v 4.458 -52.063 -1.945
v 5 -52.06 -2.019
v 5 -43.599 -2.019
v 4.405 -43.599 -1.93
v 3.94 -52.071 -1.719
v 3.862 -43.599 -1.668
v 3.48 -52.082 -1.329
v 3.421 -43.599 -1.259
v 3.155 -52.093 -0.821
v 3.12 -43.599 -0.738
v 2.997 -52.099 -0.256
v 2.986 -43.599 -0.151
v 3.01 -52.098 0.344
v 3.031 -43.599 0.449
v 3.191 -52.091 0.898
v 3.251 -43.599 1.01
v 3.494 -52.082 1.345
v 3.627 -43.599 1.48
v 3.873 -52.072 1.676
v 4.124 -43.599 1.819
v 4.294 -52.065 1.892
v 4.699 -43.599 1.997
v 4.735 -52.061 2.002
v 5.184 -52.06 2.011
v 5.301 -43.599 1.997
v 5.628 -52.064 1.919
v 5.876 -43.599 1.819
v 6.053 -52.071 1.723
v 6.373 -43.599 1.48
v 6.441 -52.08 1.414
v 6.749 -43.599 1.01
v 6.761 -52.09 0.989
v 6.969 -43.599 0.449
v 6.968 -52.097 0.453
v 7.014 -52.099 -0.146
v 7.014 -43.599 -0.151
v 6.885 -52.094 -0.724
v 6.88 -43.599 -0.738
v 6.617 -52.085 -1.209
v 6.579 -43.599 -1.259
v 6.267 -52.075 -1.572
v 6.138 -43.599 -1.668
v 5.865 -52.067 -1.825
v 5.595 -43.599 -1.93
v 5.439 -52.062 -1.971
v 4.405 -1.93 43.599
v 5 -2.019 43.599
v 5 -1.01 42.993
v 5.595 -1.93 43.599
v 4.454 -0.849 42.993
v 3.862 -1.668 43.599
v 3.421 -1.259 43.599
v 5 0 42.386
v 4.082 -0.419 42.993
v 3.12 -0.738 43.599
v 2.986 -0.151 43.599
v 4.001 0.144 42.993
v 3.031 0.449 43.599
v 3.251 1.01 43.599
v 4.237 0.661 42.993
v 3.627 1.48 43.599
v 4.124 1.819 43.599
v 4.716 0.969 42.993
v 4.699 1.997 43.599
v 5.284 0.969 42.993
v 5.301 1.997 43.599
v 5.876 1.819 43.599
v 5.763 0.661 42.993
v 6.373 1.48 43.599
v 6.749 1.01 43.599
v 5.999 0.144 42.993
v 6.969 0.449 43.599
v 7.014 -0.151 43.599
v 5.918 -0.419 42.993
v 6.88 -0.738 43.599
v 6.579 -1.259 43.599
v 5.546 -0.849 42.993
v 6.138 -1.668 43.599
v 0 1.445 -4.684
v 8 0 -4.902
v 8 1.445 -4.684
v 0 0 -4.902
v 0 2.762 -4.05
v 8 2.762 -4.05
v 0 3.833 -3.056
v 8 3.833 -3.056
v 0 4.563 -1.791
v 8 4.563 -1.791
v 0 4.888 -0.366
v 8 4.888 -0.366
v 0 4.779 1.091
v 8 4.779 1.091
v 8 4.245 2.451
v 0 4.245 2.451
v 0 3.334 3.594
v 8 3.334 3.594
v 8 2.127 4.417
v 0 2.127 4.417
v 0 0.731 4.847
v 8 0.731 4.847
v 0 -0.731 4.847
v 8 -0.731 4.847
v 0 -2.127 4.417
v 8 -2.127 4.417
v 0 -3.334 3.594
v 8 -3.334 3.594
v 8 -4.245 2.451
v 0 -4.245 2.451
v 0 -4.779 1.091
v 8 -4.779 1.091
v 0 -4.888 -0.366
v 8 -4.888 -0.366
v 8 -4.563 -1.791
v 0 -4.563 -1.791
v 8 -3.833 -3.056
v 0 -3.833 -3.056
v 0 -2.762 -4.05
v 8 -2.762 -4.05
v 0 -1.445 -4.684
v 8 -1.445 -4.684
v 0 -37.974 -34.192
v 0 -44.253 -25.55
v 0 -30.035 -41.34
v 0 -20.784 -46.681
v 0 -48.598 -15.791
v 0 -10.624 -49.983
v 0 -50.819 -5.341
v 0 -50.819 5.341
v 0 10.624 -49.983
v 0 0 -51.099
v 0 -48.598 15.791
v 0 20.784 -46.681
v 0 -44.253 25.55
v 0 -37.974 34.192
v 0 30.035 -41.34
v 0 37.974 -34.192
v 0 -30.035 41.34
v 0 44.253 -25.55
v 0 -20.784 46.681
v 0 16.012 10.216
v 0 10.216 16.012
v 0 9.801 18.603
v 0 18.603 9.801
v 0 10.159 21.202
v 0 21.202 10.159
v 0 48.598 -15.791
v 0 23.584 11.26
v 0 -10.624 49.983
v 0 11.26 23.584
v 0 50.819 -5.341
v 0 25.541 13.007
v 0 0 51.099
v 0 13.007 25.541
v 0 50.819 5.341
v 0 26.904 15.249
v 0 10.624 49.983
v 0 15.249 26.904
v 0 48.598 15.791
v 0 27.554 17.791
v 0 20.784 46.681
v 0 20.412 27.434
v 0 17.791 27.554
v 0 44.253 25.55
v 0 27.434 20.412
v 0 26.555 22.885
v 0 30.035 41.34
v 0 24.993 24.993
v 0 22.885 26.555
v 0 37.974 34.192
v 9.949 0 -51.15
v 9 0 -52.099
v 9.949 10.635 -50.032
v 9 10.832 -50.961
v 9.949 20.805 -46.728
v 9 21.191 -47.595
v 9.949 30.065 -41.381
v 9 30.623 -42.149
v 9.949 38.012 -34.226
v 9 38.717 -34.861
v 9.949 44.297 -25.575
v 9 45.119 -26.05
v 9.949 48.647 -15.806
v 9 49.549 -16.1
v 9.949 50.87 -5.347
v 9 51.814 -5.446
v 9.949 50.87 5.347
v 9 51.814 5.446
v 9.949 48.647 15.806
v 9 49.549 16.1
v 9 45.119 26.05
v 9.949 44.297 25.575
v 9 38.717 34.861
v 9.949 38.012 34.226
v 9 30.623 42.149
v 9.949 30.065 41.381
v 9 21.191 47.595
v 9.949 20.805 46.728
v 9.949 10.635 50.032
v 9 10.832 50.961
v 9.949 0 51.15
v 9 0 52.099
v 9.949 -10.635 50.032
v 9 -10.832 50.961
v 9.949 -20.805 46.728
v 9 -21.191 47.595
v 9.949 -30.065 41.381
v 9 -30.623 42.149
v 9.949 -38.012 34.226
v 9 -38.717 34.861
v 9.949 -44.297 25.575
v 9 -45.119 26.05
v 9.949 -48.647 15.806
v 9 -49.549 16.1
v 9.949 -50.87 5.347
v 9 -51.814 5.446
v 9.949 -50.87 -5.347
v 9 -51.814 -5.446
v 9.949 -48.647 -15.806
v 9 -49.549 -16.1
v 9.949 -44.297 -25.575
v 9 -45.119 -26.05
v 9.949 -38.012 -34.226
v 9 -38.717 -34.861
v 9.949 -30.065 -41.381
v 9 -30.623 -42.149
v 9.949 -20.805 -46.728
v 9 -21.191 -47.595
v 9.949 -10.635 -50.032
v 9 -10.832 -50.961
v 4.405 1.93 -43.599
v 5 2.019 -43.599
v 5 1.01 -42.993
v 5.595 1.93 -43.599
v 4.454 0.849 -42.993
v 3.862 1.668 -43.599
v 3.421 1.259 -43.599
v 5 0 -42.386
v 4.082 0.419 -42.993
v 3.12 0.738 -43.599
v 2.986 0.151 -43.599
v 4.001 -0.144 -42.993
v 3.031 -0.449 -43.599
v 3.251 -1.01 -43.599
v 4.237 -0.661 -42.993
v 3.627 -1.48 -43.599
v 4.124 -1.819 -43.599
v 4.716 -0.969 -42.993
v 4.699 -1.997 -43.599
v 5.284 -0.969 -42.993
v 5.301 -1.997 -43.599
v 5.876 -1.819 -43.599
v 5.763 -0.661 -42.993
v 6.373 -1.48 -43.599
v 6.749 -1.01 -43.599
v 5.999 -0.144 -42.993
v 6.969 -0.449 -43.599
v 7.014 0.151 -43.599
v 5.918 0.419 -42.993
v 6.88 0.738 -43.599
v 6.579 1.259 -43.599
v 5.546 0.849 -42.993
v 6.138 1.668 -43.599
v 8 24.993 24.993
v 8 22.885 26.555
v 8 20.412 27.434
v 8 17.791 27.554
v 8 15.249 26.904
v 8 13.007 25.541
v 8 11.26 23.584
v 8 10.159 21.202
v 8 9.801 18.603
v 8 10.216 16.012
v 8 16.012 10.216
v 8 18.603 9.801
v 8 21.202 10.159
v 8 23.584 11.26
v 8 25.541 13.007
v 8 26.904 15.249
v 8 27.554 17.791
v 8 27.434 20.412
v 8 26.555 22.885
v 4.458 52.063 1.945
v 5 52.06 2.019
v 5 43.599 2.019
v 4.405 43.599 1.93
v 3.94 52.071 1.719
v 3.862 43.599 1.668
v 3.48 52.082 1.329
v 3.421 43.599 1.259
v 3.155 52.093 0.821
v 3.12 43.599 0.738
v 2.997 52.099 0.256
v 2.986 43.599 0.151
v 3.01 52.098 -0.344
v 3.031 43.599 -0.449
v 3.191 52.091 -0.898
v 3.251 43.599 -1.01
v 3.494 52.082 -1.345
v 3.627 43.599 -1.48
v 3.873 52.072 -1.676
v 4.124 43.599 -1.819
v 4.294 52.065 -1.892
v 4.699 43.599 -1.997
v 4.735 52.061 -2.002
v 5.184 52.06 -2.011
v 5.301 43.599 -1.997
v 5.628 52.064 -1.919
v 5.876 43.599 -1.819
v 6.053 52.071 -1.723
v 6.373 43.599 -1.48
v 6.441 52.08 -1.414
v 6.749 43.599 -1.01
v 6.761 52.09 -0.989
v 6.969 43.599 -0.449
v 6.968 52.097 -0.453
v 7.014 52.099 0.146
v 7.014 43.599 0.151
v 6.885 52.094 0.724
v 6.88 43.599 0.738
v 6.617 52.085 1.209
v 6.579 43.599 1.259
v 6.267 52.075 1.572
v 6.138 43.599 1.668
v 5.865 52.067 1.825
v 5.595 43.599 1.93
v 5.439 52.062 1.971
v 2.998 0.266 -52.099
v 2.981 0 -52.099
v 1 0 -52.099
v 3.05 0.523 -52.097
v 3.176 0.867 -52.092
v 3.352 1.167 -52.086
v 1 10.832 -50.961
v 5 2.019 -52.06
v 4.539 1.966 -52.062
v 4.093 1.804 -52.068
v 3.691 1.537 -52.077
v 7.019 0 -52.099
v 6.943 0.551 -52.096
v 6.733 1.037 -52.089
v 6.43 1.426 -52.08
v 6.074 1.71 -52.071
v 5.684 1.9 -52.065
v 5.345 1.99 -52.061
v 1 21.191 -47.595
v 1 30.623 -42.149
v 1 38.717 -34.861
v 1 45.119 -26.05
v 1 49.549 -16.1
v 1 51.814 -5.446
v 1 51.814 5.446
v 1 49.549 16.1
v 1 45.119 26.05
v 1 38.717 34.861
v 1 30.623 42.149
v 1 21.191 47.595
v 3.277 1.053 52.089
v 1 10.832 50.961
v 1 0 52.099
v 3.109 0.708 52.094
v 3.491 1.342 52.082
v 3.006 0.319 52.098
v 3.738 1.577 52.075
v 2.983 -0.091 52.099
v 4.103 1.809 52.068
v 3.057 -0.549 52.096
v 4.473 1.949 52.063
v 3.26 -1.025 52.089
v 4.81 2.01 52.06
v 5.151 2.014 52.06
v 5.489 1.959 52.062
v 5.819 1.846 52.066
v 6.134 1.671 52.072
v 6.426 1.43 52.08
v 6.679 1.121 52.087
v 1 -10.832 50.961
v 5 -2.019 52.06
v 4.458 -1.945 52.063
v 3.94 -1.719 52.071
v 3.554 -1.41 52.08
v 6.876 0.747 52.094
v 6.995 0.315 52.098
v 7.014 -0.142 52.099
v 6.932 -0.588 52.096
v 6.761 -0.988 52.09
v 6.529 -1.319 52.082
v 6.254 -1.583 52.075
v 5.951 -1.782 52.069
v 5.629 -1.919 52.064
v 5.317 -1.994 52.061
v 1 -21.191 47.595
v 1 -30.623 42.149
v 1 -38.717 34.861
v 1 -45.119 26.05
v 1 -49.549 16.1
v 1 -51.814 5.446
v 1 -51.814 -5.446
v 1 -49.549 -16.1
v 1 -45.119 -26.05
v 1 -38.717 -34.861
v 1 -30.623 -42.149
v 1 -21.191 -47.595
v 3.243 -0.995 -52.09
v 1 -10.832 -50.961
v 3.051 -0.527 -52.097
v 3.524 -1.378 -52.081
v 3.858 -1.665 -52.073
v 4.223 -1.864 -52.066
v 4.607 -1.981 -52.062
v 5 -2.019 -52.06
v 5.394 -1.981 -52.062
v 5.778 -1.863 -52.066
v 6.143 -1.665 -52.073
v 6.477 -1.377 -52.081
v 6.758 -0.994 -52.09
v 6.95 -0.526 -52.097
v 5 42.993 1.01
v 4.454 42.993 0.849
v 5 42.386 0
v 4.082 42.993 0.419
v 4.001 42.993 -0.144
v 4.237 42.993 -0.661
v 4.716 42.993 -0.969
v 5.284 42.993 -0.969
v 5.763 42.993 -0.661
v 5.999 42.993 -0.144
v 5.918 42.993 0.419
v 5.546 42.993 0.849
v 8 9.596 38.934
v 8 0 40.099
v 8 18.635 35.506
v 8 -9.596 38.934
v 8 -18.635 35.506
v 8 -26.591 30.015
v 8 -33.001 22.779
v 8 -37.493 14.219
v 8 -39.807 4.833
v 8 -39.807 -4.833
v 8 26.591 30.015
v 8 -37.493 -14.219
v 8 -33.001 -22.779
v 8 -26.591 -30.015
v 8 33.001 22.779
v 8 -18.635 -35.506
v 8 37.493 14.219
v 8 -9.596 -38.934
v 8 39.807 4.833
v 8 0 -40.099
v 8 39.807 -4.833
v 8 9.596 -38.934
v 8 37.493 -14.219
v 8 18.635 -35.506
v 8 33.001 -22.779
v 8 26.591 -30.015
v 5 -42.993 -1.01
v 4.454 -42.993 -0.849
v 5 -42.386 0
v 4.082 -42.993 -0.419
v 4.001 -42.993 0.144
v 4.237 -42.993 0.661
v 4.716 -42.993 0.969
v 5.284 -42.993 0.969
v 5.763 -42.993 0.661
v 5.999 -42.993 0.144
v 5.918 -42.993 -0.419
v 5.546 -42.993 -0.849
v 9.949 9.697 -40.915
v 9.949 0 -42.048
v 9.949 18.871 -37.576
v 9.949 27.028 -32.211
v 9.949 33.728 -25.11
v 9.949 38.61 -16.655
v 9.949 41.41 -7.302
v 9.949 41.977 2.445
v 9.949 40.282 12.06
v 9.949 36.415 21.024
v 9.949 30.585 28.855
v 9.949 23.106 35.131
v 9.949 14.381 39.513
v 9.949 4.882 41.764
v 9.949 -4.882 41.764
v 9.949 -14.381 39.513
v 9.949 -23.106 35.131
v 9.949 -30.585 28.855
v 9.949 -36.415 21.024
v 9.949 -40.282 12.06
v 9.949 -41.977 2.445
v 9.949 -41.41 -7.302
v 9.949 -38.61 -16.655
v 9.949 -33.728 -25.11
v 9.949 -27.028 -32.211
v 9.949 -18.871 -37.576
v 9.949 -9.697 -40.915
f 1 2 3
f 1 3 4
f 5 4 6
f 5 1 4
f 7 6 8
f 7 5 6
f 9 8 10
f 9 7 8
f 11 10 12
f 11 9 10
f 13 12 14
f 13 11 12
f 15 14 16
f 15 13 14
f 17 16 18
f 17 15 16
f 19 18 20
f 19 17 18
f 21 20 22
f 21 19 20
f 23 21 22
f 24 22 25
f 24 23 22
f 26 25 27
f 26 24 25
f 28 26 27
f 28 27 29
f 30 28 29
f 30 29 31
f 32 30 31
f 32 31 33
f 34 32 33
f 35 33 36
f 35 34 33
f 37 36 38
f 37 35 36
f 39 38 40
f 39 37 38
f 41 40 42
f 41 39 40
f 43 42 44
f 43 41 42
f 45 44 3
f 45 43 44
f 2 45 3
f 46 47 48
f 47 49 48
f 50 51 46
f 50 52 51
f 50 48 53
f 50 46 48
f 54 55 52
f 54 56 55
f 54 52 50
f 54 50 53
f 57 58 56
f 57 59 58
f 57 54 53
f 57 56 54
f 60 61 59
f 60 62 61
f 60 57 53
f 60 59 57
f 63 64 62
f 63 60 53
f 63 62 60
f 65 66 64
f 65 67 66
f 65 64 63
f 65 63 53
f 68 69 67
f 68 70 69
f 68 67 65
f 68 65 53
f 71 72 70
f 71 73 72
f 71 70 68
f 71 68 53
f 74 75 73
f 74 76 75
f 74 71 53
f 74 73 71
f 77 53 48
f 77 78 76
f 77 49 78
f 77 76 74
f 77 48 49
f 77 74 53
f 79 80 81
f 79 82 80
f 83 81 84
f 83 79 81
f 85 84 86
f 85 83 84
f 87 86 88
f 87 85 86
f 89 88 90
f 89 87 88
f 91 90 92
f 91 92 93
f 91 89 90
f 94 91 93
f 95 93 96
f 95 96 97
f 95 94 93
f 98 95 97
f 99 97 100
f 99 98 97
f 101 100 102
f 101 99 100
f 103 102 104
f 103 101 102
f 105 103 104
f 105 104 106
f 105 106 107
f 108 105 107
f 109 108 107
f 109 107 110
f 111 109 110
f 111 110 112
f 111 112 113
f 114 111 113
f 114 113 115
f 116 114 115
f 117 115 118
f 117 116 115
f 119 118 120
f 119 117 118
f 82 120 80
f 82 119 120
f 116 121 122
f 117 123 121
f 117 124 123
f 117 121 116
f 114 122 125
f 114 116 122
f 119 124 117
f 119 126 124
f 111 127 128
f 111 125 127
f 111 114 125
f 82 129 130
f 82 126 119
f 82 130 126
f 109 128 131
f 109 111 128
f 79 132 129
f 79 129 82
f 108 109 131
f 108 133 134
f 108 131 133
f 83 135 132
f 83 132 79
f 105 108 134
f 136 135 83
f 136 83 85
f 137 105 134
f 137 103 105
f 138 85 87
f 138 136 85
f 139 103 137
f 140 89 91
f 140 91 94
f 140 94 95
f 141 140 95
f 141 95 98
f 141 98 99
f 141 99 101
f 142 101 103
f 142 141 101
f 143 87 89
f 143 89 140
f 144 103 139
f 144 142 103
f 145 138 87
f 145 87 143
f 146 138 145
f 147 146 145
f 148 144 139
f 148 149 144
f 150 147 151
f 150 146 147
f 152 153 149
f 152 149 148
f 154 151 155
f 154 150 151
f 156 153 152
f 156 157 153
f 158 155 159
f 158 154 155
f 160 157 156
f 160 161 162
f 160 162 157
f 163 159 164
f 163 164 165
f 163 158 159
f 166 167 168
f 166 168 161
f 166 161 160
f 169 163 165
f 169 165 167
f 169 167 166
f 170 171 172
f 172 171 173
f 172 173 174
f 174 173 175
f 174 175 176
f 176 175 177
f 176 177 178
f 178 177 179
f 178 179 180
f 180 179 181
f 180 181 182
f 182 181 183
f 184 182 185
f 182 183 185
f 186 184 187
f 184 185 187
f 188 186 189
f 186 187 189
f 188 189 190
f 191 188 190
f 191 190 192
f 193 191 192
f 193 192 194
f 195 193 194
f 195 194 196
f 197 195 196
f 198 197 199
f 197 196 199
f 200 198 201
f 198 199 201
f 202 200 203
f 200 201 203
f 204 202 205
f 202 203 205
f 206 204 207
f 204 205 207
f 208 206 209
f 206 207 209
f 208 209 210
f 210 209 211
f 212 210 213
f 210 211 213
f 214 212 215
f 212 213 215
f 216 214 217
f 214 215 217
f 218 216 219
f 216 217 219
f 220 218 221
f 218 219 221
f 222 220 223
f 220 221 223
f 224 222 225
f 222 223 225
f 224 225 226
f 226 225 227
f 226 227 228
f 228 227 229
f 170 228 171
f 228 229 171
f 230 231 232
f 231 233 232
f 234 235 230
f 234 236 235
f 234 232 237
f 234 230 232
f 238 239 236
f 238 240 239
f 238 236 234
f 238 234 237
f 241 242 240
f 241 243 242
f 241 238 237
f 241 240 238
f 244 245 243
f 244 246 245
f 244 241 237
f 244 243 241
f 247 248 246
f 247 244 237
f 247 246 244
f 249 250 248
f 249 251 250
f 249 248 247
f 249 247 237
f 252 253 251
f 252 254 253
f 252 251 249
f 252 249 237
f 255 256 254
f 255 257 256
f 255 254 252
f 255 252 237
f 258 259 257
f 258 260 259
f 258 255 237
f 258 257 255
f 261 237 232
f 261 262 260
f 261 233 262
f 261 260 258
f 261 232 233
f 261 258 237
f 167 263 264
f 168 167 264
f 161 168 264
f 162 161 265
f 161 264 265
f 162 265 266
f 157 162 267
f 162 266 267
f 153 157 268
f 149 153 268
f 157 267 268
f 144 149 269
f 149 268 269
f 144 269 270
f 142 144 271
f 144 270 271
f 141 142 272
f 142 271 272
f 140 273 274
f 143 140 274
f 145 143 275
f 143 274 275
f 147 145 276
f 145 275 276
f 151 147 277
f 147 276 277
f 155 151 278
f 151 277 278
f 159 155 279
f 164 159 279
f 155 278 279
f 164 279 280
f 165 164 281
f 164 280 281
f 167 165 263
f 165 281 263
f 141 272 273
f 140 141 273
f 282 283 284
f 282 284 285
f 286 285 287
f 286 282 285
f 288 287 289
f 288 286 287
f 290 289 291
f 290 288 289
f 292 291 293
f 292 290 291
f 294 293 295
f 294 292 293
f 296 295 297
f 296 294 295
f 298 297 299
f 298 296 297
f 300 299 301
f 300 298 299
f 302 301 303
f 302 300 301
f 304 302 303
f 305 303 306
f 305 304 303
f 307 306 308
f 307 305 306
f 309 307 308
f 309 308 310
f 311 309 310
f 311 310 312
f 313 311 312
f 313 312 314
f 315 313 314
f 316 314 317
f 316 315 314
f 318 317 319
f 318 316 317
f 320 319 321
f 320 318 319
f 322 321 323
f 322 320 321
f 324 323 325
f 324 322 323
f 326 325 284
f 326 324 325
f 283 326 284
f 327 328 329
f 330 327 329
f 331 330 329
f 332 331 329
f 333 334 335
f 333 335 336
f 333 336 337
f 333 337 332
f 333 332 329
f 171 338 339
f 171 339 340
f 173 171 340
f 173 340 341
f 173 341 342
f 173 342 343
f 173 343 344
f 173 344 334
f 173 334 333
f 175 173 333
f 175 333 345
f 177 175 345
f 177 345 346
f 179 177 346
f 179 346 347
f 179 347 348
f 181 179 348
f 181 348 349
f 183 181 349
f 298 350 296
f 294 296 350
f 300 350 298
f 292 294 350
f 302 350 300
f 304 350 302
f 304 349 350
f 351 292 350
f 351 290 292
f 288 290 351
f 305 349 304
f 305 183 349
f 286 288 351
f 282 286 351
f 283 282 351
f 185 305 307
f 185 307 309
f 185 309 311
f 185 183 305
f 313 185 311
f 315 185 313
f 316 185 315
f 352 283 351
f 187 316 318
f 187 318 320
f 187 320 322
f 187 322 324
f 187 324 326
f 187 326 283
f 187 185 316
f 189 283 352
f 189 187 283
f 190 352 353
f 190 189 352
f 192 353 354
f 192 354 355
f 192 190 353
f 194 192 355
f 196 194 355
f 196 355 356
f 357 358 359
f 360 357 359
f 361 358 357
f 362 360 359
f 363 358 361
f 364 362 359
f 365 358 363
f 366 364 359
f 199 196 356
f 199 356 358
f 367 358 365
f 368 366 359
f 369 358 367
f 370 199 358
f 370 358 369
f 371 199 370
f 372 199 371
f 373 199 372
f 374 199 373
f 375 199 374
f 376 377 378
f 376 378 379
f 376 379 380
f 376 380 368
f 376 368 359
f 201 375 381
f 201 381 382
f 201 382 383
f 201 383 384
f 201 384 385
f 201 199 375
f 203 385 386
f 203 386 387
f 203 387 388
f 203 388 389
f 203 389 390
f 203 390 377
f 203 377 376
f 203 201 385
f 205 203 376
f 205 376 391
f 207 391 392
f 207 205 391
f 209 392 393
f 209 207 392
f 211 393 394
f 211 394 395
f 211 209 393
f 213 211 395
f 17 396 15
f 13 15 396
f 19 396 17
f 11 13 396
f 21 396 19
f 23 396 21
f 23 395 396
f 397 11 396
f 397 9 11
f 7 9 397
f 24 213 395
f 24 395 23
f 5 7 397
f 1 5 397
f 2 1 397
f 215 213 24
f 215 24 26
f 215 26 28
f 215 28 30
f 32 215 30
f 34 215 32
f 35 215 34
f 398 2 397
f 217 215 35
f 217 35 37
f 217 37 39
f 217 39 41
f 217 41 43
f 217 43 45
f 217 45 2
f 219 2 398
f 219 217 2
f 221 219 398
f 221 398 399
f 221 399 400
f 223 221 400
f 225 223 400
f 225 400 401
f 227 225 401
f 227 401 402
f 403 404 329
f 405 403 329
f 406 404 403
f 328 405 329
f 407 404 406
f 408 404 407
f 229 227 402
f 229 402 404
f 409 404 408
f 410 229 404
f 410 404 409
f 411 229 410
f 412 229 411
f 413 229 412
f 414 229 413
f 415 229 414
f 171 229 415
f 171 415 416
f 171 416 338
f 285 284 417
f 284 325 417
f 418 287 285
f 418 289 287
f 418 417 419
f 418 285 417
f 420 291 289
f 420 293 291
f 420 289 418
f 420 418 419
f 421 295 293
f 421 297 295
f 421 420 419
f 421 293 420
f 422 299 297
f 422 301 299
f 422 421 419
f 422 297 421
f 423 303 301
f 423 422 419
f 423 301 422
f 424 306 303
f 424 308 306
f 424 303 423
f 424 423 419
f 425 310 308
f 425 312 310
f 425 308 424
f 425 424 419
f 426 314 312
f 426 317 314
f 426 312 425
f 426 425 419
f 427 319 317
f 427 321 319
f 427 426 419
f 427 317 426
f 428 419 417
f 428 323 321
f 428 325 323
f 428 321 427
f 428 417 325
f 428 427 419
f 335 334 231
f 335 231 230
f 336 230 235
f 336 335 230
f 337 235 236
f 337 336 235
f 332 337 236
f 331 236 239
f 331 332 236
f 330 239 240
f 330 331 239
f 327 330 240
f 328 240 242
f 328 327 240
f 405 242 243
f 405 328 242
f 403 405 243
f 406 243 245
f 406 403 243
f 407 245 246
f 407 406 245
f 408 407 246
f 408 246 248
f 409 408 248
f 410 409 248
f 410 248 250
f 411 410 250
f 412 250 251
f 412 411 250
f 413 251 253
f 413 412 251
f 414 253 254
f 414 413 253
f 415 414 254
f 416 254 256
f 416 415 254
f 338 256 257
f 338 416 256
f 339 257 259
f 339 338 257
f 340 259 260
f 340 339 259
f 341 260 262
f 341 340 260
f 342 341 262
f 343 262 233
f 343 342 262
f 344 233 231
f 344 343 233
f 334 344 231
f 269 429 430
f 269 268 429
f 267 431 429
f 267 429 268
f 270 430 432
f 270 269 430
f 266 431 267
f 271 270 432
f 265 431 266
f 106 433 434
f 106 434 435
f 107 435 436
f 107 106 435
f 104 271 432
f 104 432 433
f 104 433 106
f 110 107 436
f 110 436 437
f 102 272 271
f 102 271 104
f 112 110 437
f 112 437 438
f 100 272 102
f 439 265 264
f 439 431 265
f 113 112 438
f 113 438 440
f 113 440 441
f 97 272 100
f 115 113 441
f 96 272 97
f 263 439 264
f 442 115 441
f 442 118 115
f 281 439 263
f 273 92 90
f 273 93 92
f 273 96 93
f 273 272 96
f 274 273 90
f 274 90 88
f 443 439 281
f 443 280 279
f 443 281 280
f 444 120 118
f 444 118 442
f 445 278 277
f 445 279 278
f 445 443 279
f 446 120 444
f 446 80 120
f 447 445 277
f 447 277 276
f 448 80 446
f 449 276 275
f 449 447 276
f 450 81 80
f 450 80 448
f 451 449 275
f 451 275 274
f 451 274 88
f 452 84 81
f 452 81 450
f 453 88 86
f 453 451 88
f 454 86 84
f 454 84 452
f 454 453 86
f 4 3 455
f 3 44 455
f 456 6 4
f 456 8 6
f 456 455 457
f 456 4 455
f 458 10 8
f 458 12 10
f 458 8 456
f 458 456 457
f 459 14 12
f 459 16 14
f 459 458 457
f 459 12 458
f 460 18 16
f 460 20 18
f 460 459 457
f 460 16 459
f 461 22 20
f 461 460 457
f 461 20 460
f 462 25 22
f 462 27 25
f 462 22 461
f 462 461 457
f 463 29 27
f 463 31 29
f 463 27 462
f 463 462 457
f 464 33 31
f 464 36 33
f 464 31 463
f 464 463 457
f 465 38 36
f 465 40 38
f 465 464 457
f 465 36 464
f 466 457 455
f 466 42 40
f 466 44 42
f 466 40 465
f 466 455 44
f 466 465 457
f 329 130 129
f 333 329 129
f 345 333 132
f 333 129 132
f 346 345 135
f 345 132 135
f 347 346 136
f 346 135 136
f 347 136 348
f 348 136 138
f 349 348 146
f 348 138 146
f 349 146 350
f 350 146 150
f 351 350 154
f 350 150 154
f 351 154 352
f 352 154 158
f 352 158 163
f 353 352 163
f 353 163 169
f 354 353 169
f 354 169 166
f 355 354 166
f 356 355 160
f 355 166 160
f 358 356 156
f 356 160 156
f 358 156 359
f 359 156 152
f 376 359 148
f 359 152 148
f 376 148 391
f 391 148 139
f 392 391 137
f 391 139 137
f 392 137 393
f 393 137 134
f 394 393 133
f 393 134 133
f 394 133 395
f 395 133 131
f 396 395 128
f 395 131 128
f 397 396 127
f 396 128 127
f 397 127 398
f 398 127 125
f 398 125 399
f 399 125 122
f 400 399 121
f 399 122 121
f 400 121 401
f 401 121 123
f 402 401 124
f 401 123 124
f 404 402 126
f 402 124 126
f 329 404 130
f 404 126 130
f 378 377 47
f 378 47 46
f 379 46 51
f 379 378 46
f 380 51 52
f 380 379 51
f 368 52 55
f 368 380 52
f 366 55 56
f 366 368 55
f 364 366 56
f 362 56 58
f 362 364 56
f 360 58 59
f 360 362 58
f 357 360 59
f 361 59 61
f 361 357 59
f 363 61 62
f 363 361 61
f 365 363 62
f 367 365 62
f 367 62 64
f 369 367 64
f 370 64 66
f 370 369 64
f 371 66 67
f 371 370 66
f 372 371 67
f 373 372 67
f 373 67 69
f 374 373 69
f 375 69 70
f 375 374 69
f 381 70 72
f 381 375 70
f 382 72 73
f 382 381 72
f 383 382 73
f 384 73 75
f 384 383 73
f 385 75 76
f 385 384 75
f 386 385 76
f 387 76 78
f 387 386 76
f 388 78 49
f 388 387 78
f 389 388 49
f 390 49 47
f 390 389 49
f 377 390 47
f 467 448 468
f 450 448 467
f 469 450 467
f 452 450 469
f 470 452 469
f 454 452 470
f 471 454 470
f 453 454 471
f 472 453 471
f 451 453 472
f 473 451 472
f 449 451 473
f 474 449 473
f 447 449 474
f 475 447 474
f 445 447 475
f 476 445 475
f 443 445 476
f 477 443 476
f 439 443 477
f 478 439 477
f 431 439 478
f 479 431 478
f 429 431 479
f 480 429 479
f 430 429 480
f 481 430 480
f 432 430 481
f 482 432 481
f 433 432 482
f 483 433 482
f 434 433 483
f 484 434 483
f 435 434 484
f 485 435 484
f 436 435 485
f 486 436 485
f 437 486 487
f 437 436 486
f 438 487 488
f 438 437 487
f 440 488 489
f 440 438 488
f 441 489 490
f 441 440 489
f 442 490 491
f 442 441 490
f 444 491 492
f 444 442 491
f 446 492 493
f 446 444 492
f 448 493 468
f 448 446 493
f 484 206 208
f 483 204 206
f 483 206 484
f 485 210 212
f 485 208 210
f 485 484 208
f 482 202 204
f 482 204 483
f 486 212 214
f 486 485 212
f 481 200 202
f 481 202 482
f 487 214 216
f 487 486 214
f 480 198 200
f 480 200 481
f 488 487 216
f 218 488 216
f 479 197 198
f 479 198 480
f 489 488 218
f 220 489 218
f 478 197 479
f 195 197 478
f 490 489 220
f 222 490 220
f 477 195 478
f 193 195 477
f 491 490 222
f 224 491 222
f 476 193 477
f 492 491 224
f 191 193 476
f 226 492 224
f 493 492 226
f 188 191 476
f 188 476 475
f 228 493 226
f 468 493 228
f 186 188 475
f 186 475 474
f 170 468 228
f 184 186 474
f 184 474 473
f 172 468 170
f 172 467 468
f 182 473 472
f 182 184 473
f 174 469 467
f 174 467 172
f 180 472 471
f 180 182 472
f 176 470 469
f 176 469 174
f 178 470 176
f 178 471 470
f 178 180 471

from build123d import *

# Parameters (mm, degrees)
CUT_EXTRUDE1_DEPTH = 10
CIRPATTERN2_COUNT  = 4
CHAMFER1_SIZE      = 1
CHAMFER2_SIZE      = 1
SKETCH8_R          = 52.0992
CUT_EXTRUDE2_DEPTH = 0.0508


with BuildPart() as part:
    # Sketch1 → Revolve1 (revolve)
    with BuildSketch(Plane(origin=(0, 0, 0), x_dir=(1, 0, 0), z_dir=(0, 1, 0))):
        Polygon((0, 4.9022), (0, 52.0992), (10, 52.0992), (10, 42.0992), (8, 40.0992), (8, 4.9022), align=None)
    revolve(axis=Axis((0, 0, 0), (1, 0, 0)))

    # Sketch3 → Cut-Extrude1 (cut)
    with BuildSketch(Plane(origin=(8, 0, 0), x_dir=(0, 0, -1), z_dir=(1, 0, 0))):
        with BuildLine():
            Line((-16.012131778, 10.215581079), (-10.215581079, 16.012131778))
            ThreePointArc((-10.215581079, 16.012131778), (-14.077724842, 26.305561936), (-24.993250353, 24.993250353))
            ThreePointArc((-24.993250353, 24.993250353), (-26.305561936, 14.077724842), (-16.012131778, 10.215581079))
        make_face()
    extrude(amount=-CUT_EXTRUDE1_DEPTH, mode=Mode.SUBTRACT)

    # Sketch6 → #10-32 Tapped Hole1 (revolve, cut)
    with BuildSketch(Plane(origin=(5, 0, 52.0992), x_dir=(0, -1, 0), z_dir=(1, 0, 0))):
        Polygon((0, 0), (0, 9.713317848), (2.0193, 8.5), (2.0193, 0), align=None)
    f_10_32_tapped_hole1 = revolve(axis=Axis((5, 0, 58.4492), (0, 0, -1)), mode=Mode.SUBTRACT)

    # CirPattern2: #10-32 Tapped Hole1 ×4 about axis
    cirpattern2_axis = Axis((0, 0, 0), (-1, 0, 0))
    for i in range(1, CIRPATTERN2_COUNT):
        add(f_10_32_tapped_hole1.rotate(cirpattern2_axis, i * 360 / CIRPATTERN2_COUNT), mode=Mode.SUBTRACT)

    # Chamfer1
    chamfer1_edges = [part.edges().sort_by_distance(p)[0] for p in [
        (10, 0, 52.0992),
    ]]
    chamfer(chamfer1_edges, length=CHAMFER1_SIZE)

    # Chamfer2
    chamfer2_edges = [part.edges().sort_by_distance(p)[0] for p in [
        (0, 0, 52.0992),
    ]]
    chamfer(chamfer2_edges, length=CHAMFER2_SIZE)

    # Sketch8 → Cut-Extrude2 (cut)
    with BuildSketch(Plane(origin=(10, 0, 0), x_dir=(0, 0, -1), z_dir=(1, 0, 0))):
        Circle(SKETCH8_R)
    extrude(amount=-CUT_EXTRUDE2_DEPTH, mode=Mode.SUBTRACT)


solid = part.part
